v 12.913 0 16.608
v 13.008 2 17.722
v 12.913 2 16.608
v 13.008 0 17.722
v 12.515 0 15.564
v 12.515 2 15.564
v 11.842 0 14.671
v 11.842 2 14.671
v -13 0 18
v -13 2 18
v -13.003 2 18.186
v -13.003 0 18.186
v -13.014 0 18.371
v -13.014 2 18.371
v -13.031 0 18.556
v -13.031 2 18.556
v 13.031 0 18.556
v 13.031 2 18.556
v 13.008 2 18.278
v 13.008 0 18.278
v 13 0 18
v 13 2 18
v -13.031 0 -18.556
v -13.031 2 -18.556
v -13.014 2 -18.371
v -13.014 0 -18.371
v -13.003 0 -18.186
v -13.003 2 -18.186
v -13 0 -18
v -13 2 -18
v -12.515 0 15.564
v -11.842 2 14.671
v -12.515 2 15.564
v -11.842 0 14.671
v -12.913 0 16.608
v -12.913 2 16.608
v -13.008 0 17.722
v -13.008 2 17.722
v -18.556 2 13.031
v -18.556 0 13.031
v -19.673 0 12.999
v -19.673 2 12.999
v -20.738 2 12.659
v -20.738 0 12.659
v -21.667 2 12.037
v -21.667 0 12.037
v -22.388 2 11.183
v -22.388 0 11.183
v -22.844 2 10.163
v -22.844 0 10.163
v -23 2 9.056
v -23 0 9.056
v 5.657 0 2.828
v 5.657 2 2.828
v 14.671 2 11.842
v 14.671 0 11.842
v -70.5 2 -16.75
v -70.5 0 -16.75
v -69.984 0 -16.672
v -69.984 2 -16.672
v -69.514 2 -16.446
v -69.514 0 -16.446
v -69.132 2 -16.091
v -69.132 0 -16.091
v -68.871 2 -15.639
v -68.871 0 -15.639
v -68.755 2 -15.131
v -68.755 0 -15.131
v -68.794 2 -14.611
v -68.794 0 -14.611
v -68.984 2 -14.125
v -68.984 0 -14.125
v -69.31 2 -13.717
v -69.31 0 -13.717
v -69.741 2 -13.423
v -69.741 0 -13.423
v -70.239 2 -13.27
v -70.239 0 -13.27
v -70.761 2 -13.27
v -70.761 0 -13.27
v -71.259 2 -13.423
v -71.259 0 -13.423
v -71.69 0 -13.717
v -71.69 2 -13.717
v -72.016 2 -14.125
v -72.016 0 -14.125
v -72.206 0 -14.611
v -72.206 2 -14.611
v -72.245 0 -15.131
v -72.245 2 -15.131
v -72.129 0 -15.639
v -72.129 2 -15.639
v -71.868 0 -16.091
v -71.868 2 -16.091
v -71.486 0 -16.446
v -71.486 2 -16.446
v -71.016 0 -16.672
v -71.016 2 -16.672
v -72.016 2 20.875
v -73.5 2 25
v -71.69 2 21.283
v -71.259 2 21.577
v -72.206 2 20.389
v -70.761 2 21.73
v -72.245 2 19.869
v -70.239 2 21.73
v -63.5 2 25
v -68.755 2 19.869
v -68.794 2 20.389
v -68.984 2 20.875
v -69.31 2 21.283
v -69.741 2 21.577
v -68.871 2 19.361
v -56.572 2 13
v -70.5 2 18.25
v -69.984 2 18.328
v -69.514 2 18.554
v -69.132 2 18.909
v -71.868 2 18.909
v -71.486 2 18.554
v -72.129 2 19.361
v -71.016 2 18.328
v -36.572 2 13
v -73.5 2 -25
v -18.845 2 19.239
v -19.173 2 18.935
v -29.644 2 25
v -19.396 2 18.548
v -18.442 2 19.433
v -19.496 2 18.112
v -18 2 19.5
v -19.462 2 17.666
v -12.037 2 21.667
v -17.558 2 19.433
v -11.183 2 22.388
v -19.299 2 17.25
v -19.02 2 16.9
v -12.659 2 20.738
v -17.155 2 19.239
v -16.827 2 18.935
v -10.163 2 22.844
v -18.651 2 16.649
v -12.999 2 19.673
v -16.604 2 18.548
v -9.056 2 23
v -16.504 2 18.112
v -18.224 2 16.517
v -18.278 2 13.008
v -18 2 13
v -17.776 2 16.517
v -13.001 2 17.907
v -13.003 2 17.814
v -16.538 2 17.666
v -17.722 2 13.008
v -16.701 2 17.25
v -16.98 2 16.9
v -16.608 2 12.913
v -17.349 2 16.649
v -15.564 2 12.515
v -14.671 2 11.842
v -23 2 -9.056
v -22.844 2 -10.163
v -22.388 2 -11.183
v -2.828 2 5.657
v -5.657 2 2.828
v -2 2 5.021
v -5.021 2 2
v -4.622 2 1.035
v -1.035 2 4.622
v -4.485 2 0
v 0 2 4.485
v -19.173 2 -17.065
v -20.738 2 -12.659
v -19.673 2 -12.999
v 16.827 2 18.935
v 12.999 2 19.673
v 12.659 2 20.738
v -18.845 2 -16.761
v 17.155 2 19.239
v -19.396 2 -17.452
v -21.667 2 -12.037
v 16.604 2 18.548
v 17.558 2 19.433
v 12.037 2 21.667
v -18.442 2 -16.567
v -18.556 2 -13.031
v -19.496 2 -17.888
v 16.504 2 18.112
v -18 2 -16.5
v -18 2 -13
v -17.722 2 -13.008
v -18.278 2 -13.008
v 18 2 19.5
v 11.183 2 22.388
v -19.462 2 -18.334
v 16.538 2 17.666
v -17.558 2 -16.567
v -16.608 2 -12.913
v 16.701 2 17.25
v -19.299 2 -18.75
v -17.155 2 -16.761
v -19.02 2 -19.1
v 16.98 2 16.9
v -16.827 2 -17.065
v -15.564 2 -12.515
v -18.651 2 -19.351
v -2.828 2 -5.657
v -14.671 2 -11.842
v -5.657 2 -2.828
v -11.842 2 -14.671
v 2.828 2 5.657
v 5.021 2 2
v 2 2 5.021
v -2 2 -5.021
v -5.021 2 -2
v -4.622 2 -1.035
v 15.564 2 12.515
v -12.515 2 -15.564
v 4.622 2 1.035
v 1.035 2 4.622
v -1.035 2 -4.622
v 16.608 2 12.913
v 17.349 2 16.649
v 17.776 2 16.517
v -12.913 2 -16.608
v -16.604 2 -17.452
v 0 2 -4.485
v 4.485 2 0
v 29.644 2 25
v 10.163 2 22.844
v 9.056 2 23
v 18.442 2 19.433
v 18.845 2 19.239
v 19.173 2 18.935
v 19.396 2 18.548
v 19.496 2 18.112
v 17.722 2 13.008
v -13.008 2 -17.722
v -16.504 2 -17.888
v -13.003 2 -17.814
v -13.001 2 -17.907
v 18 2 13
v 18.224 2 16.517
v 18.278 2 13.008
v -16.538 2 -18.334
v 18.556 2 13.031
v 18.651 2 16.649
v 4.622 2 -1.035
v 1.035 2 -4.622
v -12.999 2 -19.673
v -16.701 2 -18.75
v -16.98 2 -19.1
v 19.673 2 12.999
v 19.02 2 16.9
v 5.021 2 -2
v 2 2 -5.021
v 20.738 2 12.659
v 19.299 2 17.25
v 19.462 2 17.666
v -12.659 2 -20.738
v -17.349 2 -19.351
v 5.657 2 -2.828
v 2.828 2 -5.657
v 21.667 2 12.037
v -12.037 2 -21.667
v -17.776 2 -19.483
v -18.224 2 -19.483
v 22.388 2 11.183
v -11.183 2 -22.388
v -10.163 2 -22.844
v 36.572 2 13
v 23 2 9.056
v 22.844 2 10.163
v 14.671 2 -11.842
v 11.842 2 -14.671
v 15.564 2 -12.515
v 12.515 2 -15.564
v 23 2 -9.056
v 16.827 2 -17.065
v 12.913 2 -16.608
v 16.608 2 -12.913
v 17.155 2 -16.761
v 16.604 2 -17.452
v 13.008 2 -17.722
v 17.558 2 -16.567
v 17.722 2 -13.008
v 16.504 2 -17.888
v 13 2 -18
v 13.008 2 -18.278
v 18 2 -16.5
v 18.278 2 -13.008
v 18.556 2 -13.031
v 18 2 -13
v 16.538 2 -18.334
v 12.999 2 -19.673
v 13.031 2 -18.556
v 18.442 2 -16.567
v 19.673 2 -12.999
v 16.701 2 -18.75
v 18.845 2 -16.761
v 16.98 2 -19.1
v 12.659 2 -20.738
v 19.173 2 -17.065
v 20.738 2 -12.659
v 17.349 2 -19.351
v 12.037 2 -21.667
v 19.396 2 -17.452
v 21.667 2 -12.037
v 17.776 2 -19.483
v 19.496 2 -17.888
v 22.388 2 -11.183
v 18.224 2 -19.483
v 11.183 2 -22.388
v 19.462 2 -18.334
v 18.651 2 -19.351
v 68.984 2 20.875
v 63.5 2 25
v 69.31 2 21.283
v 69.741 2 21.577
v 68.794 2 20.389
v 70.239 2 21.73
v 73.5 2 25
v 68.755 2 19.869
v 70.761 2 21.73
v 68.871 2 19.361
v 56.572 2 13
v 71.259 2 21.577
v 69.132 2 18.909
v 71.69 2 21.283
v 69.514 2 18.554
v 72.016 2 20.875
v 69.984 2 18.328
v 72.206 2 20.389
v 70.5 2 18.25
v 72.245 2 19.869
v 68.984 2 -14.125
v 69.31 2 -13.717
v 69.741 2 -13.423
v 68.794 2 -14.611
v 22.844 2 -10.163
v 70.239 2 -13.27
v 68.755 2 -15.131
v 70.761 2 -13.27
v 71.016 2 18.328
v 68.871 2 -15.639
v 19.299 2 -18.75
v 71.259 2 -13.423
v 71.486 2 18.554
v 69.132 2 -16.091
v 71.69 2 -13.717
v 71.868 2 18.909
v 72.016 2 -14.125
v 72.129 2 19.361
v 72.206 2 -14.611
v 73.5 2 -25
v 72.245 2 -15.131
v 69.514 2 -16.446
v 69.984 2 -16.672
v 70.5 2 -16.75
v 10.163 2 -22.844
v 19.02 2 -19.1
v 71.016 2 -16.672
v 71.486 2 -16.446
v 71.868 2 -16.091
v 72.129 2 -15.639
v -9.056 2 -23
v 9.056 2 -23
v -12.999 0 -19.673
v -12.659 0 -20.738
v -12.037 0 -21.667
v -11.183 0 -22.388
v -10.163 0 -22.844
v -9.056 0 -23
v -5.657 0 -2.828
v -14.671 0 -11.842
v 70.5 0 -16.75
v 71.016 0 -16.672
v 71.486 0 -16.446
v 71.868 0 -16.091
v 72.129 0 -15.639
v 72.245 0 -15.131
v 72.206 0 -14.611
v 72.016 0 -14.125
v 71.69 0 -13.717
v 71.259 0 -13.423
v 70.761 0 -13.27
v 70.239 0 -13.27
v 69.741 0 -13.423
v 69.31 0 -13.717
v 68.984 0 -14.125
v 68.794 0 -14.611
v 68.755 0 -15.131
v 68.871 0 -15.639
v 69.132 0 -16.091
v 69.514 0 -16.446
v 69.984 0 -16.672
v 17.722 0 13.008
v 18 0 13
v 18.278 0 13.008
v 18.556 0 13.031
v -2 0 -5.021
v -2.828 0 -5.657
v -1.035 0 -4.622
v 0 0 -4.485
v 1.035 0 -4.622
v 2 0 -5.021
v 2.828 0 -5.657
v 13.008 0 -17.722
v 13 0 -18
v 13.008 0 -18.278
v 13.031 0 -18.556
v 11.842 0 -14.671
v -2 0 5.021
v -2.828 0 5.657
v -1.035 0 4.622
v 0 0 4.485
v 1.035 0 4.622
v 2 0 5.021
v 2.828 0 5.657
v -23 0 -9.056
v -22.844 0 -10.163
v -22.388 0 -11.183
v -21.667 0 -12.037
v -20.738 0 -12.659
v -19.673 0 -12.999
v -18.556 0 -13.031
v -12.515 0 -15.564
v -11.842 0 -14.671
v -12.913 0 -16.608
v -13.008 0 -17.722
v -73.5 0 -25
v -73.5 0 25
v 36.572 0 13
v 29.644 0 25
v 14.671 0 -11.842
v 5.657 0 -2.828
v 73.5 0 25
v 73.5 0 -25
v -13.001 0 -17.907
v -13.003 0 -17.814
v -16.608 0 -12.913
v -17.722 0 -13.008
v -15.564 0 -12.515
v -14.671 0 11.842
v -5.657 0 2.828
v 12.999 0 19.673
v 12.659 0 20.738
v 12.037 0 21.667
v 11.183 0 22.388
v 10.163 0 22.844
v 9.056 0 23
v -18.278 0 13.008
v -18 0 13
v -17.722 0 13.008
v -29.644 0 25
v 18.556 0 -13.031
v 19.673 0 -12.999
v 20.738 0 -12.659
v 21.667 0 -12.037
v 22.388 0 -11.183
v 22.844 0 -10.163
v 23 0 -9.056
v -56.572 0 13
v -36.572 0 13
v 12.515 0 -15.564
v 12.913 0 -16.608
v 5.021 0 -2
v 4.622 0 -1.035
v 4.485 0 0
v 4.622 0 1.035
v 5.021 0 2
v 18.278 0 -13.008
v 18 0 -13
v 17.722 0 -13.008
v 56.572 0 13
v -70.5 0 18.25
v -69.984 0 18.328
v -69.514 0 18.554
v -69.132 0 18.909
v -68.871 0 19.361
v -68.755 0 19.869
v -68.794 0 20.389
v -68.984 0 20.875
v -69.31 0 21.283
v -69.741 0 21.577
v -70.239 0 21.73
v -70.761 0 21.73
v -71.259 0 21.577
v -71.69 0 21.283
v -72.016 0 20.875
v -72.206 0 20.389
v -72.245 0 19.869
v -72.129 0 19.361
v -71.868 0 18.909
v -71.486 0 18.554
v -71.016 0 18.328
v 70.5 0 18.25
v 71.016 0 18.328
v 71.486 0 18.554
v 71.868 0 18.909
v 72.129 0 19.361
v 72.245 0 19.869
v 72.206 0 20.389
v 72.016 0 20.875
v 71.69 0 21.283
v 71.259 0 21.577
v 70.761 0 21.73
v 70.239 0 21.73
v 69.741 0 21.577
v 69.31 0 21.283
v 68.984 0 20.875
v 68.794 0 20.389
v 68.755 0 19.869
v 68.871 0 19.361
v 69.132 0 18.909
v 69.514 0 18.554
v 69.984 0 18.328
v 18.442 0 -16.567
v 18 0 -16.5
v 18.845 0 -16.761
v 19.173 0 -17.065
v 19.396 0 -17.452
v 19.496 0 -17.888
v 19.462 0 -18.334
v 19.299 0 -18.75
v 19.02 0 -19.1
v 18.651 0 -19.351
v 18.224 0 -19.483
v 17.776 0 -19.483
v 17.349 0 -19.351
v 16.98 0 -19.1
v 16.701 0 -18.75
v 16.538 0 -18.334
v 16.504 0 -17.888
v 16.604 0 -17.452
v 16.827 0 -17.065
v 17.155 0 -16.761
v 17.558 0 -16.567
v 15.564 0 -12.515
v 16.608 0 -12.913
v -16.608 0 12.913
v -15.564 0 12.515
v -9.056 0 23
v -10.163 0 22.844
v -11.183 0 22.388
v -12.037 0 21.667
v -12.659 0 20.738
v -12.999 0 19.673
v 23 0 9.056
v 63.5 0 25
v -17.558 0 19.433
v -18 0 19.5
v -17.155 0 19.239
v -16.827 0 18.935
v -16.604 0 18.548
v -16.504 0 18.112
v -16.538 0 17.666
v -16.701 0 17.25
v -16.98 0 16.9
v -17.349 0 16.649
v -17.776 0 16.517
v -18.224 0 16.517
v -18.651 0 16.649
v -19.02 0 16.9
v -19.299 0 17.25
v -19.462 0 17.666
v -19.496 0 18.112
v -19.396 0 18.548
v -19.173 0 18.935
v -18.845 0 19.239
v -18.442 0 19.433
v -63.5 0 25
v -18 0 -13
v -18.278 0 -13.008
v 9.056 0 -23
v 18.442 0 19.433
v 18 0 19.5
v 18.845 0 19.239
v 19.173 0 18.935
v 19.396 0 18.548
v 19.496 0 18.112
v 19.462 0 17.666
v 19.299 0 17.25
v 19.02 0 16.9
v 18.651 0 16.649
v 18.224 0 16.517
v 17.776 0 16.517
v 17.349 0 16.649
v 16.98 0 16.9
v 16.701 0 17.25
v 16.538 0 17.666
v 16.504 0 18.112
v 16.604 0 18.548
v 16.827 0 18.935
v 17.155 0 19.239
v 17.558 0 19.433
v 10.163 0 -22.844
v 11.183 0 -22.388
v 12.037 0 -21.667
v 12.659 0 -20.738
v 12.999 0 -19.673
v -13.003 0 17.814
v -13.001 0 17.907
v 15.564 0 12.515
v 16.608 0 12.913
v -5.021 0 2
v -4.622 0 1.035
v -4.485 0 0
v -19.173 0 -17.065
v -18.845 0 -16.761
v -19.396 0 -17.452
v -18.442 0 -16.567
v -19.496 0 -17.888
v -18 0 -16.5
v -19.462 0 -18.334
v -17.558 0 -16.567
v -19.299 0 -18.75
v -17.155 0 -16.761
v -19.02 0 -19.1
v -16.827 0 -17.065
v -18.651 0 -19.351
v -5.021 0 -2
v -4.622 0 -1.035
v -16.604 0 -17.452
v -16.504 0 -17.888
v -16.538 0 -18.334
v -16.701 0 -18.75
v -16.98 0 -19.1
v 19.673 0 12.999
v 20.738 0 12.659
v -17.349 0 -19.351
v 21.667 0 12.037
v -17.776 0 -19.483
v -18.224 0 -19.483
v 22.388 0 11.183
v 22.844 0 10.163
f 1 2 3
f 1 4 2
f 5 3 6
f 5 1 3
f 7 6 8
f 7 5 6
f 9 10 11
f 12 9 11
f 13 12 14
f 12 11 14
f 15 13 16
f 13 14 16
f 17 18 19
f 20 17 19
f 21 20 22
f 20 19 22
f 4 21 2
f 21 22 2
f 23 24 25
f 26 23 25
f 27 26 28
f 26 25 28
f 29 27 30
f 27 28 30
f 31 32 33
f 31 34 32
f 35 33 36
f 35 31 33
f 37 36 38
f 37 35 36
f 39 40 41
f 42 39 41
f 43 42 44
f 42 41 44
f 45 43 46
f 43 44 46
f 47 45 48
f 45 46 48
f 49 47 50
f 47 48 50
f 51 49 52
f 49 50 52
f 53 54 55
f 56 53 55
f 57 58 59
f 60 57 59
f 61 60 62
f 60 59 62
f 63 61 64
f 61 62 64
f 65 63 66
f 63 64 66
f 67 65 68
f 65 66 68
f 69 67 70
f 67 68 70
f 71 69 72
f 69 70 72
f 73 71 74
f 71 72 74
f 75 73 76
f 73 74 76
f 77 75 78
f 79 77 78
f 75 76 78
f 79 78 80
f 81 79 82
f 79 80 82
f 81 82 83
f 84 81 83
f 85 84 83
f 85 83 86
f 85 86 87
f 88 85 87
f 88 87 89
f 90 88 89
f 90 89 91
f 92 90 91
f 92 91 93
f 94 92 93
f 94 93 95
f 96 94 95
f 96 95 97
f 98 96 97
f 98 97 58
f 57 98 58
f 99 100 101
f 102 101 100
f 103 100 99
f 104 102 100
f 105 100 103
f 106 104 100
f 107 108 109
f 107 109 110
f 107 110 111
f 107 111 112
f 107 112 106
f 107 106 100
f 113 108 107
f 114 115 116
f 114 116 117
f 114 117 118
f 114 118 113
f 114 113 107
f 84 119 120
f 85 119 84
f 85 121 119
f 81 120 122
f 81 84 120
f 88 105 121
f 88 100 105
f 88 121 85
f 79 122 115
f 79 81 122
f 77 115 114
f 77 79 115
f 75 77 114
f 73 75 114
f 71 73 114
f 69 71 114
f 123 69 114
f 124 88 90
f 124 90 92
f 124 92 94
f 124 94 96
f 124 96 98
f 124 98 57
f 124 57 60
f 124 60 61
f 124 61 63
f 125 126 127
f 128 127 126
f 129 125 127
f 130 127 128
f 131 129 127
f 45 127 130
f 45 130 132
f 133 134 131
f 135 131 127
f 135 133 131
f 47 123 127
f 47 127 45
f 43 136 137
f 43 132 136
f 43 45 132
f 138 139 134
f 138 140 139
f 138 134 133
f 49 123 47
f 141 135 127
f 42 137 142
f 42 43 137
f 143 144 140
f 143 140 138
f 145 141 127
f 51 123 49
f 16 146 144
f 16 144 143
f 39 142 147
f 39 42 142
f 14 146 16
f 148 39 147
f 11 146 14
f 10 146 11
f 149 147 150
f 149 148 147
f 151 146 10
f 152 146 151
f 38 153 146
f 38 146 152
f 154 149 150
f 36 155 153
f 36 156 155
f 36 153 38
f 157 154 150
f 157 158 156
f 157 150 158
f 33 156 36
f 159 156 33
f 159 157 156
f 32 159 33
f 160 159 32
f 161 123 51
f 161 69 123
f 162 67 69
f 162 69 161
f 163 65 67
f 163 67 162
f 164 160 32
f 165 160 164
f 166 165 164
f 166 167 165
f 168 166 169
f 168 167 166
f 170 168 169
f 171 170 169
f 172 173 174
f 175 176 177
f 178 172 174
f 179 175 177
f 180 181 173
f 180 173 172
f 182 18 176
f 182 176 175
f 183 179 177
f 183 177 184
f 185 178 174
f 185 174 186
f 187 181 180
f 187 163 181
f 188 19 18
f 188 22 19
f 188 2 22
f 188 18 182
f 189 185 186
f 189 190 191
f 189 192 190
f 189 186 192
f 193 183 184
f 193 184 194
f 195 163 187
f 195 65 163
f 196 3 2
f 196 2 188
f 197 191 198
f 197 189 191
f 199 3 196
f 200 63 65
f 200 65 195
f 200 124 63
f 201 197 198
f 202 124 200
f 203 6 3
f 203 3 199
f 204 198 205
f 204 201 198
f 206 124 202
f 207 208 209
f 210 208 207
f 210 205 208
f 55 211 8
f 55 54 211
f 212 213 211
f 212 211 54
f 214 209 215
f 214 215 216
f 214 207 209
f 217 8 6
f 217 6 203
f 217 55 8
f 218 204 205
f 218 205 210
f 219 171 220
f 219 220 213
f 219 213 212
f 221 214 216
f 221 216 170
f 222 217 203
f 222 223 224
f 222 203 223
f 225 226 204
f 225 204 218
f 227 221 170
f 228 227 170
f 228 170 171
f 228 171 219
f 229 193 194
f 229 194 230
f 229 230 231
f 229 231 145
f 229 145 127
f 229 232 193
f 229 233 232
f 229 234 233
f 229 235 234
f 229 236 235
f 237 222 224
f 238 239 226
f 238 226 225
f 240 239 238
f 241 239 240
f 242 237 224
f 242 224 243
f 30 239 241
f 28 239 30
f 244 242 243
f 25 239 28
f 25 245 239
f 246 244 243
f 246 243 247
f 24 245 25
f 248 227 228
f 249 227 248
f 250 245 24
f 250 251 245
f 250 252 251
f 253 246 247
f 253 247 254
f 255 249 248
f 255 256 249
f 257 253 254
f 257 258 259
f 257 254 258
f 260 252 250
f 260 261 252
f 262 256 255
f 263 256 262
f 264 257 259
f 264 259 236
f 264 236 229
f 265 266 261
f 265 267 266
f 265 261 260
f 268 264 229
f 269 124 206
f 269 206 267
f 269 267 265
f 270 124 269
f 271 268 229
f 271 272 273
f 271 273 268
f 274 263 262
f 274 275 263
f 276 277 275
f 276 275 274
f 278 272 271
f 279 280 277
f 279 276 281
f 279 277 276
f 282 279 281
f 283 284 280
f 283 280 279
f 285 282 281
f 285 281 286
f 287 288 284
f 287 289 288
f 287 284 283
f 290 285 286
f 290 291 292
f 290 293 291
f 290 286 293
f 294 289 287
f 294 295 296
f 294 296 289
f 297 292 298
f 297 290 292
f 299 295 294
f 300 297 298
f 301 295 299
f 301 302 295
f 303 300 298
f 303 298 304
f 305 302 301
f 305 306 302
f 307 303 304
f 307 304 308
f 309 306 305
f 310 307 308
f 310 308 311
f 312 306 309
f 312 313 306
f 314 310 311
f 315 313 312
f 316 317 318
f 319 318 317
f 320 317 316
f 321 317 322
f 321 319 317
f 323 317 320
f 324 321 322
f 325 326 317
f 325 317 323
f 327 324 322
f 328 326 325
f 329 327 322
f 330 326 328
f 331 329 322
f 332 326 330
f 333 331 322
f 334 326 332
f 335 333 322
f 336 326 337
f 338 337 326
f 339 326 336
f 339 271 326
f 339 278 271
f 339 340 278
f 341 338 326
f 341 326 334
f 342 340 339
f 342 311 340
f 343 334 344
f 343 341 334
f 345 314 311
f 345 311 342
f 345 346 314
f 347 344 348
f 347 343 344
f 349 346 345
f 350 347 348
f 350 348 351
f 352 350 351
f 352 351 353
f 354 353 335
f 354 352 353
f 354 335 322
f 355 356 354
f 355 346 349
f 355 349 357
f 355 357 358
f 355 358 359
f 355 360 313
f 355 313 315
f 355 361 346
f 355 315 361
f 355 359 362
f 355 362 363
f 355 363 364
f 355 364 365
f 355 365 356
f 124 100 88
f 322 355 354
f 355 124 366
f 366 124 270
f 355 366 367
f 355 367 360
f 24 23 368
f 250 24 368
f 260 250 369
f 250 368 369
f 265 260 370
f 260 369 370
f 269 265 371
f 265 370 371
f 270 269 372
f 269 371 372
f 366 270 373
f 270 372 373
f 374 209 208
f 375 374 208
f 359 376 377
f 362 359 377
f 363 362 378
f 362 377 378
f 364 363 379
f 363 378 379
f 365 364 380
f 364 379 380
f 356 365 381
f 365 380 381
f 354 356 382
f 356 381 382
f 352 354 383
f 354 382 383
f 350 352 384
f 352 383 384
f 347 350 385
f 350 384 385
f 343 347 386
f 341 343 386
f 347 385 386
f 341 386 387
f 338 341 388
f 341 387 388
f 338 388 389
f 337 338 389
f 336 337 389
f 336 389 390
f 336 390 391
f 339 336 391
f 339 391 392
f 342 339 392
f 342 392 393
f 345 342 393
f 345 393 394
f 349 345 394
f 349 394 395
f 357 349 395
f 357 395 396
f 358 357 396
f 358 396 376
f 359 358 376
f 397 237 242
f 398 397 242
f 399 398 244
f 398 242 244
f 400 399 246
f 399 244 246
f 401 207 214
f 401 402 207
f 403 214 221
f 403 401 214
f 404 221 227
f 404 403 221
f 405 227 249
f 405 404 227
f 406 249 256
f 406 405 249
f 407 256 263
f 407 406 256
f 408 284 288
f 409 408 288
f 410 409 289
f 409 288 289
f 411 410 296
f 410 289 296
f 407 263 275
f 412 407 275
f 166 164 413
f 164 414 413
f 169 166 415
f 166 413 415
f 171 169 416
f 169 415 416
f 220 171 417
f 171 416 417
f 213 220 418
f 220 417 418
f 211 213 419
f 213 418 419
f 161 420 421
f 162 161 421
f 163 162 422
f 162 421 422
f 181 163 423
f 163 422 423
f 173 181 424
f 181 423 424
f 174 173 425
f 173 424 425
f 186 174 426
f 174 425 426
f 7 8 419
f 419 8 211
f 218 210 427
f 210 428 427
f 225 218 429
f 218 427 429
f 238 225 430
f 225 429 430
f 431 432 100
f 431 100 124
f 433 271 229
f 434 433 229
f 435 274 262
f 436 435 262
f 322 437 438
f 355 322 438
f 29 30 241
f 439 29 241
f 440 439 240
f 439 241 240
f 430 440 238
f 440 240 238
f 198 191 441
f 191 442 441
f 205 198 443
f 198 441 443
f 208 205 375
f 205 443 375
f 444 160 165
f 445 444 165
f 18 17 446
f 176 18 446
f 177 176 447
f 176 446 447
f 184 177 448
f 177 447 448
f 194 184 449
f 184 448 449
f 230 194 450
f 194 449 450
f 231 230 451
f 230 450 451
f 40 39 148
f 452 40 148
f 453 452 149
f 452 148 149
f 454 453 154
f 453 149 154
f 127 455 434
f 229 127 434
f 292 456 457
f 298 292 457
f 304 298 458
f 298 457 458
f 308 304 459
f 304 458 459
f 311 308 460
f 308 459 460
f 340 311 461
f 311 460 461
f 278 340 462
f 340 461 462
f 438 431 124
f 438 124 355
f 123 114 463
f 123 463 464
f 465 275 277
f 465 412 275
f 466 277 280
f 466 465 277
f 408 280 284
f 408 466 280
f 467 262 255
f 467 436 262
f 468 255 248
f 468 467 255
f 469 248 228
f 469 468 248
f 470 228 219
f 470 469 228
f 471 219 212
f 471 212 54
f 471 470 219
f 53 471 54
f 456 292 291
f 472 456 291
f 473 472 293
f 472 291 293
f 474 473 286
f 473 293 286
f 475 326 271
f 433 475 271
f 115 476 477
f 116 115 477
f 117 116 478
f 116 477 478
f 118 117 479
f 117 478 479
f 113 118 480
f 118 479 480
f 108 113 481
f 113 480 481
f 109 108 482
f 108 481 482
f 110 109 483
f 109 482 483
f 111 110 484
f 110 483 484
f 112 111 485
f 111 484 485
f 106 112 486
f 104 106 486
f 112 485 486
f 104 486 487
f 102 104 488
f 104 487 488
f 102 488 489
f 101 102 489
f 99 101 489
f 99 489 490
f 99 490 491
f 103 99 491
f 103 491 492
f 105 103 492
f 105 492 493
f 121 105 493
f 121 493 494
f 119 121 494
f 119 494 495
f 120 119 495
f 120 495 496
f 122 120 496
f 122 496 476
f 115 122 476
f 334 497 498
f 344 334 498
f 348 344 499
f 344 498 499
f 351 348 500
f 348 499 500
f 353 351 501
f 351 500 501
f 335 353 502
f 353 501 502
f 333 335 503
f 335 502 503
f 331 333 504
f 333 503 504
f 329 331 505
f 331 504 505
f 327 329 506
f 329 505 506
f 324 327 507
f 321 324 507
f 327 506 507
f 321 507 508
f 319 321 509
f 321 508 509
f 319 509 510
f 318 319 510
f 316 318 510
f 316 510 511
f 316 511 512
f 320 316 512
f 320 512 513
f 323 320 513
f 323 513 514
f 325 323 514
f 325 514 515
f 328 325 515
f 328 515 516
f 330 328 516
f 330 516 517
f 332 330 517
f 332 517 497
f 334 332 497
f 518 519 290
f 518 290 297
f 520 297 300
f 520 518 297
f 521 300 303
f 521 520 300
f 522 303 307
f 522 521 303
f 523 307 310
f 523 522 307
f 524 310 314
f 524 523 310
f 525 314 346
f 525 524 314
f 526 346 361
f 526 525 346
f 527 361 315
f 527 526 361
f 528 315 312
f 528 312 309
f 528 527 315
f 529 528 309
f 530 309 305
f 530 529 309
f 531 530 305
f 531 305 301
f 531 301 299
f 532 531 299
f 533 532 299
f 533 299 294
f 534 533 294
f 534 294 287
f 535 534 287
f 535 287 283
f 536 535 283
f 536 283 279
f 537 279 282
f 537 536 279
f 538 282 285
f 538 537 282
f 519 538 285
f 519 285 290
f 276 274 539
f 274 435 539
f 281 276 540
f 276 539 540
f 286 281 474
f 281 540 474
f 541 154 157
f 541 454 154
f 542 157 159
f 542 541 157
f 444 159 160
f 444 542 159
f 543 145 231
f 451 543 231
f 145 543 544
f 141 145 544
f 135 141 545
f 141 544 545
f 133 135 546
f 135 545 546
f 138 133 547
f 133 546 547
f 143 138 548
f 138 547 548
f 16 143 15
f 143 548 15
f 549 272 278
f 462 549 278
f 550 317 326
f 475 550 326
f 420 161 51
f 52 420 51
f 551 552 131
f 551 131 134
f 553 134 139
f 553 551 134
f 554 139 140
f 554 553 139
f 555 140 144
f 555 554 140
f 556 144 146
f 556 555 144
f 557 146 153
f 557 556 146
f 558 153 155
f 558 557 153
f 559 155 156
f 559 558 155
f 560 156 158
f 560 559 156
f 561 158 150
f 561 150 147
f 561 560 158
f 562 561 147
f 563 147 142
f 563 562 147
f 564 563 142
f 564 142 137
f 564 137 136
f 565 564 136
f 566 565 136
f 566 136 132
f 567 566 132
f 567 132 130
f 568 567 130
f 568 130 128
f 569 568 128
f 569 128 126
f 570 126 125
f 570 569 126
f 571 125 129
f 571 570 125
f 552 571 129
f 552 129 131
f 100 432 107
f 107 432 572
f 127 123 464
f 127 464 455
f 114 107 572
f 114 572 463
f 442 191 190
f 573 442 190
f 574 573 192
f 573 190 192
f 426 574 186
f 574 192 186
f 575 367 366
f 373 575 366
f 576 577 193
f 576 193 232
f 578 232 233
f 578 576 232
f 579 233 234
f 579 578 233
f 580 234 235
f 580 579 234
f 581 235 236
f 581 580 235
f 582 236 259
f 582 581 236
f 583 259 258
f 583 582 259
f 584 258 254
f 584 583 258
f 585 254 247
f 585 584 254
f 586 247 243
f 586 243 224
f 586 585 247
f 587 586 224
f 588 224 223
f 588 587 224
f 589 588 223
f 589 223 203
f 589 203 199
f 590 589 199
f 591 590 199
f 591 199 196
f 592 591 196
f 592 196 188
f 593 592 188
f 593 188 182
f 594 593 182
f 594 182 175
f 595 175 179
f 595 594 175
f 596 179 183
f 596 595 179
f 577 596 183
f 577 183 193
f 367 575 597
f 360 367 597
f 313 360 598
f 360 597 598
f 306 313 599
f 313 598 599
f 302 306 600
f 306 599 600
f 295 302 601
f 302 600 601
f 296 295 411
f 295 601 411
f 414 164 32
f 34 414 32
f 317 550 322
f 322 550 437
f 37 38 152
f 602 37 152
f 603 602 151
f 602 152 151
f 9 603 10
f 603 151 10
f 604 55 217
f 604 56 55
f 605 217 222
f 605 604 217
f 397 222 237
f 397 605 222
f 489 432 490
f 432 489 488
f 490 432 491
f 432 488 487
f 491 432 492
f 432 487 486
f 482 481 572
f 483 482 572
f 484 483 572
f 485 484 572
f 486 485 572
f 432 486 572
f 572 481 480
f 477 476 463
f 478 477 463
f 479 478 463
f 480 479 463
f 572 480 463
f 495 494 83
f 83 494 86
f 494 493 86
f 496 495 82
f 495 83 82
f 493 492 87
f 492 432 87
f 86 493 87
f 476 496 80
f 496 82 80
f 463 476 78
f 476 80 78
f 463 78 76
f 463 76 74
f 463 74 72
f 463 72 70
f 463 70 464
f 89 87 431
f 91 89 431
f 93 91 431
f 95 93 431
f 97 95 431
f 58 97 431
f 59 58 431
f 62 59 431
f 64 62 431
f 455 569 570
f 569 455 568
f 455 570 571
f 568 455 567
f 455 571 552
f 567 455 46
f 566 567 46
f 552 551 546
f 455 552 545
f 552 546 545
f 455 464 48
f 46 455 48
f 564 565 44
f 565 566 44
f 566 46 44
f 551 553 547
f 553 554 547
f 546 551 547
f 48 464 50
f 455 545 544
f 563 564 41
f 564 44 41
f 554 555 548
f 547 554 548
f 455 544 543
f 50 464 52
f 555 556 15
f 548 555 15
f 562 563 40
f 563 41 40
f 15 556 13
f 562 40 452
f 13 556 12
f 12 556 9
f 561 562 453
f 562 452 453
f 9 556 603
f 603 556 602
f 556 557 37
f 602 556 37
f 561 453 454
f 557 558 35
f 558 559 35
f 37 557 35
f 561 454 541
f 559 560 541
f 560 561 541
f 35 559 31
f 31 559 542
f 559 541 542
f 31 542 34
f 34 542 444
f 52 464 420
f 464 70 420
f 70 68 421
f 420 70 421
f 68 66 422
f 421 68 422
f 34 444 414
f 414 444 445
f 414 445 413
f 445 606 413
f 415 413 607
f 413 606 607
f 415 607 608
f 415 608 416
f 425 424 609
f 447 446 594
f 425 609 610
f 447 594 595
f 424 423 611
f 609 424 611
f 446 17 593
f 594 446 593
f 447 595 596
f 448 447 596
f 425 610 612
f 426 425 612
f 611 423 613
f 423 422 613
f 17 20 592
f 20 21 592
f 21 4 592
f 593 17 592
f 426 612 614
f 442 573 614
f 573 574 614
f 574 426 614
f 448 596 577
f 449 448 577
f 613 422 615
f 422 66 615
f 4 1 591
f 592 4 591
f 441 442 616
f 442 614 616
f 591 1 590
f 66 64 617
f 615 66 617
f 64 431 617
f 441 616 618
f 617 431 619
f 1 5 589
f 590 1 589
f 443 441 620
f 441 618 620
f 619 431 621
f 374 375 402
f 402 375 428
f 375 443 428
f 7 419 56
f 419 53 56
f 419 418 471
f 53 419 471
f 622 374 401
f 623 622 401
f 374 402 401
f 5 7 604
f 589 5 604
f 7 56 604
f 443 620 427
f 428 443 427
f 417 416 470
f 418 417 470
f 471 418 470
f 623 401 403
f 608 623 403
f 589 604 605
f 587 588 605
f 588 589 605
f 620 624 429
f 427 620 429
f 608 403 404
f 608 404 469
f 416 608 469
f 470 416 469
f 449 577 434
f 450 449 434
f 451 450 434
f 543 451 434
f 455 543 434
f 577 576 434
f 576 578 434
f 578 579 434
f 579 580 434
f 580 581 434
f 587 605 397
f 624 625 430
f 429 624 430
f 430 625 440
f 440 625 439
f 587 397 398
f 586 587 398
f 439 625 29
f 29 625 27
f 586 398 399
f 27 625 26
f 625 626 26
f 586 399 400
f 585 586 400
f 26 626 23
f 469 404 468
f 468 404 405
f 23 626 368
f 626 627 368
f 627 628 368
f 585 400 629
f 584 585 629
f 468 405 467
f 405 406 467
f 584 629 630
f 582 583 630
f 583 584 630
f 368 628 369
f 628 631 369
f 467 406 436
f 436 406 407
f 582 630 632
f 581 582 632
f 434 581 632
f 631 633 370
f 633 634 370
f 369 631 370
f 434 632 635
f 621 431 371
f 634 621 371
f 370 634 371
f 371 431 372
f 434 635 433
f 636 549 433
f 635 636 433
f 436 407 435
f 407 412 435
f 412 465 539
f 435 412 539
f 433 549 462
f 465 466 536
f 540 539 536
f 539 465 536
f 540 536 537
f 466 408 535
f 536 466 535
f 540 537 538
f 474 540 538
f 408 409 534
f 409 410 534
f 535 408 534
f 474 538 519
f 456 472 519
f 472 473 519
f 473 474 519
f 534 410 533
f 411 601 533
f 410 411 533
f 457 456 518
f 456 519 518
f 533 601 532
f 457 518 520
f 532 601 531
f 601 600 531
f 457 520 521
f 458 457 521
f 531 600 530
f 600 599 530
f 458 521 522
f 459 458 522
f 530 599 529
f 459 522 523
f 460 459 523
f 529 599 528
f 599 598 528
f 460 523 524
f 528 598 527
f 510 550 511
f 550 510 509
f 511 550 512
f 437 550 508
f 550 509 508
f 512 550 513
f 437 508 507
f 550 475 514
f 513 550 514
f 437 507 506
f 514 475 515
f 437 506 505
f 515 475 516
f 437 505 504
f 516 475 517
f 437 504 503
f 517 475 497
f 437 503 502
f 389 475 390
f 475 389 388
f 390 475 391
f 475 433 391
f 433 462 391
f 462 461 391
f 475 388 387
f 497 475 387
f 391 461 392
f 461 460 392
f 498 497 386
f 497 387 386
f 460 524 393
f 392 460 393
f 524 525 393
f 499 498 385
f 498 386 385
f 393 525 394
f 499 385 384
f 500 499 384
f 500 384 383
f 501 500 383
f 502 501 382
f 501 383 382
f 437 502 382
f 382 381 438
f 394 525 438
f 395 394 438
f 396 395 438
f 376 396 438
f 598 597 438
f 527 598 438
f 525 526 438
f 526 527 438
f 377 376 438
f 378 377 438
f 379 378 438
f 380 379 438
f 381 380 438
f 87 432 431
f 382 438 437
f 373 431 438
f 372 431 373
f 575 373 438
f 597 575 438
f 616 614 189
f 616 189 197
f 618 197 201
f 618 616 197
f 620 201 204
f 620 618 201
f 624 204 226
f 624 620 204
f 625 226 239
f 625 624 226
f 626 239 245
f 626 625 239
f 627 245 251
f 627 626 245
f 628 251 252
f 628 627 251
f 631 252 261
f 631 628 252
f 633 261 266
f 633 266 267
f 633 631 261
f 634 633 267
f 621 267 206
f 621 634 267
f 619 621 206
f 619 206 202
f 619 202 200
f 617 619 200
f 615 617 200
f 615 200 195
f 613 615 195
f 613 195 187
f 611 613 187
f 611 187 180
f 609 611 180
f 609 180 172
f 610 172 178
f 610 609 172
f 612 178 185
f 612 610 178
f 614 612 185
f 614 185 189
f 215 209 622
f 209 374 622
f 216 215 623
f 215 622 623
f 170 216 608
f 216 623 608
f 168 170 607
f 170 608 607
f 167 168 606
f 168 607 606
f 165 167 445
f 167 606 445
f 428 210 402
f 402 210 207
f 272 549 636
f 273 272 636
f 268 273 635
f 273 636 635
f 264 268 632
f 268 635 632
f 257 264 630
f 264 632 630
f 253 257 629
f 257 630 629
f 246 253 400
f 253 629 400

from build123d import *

# Parameters (mm, degrees)
SKETCH_1_W          = 147
SKETCH_1_H          = 50
SKETCH_1_R          = 1.5
EXTRUDE_1_DEPTH     = 2
CUT_EXTRUDE_1_DEPTH = 2
FILLET_2_DEPTH      = 2
FILLET_3_R          = 4
CUT_EXTRUDE_3_DEPTH = 78.661122835
SKETCH_7_R          = 1.75
CUT_EXTRUDE_4_DEPTH = 78.661122835


with BuildPart() as part:
    # 草图1 → 凸台-拉伸1 (new body)
    with BuildSketch(Plane(origin=(0, 0, 0), x_dir=(1, 0, 0), z_dir=(0, 1, 0))):
        Rectangle(SKETCH_1_W, SKETCH_1_H)
        with Locations(Location((18, -18, 0), (0, 0, 270))):
            Circle(SKETCH_1_R, mode=Mode.SUBTRACT)
        with Locations(Location((-18, -18, 0), (0, 0, 270))):
            Circle(SKETCH_1_R, mode=Mode.SUBTRACT)
        with Locations(Location((-18, 18, 0), (0, 0, 270))):
            Circle(SKETCH_1_R, mode=Mode.SUBTRACT)
        with Locations(Location((18, 18, 0), (0, 0, 270))):
            Circle(SKETCH_1_R, mode=Mode.SUBTRACT)
    extrude(amount=EXTRUDE_1_DEPTH)

    # 草图3 → 切除-拉伸1 (cut)
    with BuildSketch(Plane(origin=(0, 2, 0), x_dir=(1, 0, 0), z_dir=(0, 1, 0))):
        with BuildLine():
            Line((-13.345416088, 16.173843213), (0, 2.828427125))
            Line((0, 2.828427125), (13.345416088, 16.173843213))
            ThreePointArc((13.345416088, 16.173843213), (13.868972045, 20.816843629), (18, 23))
            Line((18, 23), (-18, 23))
            ThreePointArc((-18, 23), (-14.464466094, 21.535533906), (-13, 18))
            ThreePointArc((-13, 18), (-13.087112888, 17.070731352), (-13.345416088, 16.173843213))
        make_face()
        with BuildLine():
            Line((16.173843213, 13.345416088), (2.828427125, 0))
            Line((2.828427125, 0), (16.173843213, -13.345416088))
            ThreePointArc((16.173843213, -13.345416088), (20.816843629, -13.868972045), (23, -18))
            Line((23, -18), (23, 18))
            ThreePointArc((23, 18), (20.816843629, 13.868972045), (16.173843213, 13.345416088))
        make_face()
        with BuildLine():
            Line((0, -2.828427125), (-13.345416088, -16.173843213))
            ThreePointArc((-13.345416088, -16.173843213), (-13.087112888, -17.070731352), (-13, -18))
            ThreePointArc((-13, -18), (-14.464466094, -21.535533906), (-18, -23))
            Line((-18, -23), (18, -23))
            ThreePointArc((18, -23), (13.868972045, -20.816843629), (13.345416088, -16.173843213))
            Line((13.345416088, -16.173843213), (0, -2.828427125))
        make_face()
        with BuildLine():
            ThreePointArc((-23, -18), (-20.816843629, -13.868972045), (-16.173843213, -13.345416088))
            Line((-16.173843213, -13.345416088), (-2.828427125, 0))
            Line((-2.828427125, 0), (-16.173843213, 13.345416088))
            ThreePointArc((-16.173843213, 13.345416088), (-20.816843629, 13.868972045), (-23, 18))
            Line((-23, 18), (-23, -18))
        make_face()
    extrude(amount=-CUT_EXTRUDE_1_DEPTH, mode=Mode.SUBTRACT)

    # 圆角2: read off the stored shape, not the designer's step
    # 圆角2 outline → 圆角2 (add)
    with BuildSketch(Plane(origin=(0, 0, 0), x_dir=(1, 0, 0), z_dir=(0, 1, 0))):
        with BuildLine():
            Line((-23, 18), (-23, 9.05572809))
            ThreePointArc((-23, 9.05572809), (-21.666666667, 12.03715206), (-18.555555556, 13.03096005))
            ThreePointArc((-18.555555556, 13.03096005), (-21.726779962, 14.666666667), (-23, 18))
        make_face()
        with BuildLine():
            ThreePointArc((-18.555555556, -13.03096005), (-21.666666667, -12.03715206), (-23, -9.05572809))
            Line((-23, -9.05572809), (-23, -18))
            ThreePointArc((-23, -18), (-21.726779962, -14.666666667), (-18.555555556, -13.03096005))
        make_face()
        with BuildLine():
            ThreePointArc((13.03096005, -18.555555556), (12.03715206, -21.666666667), (9.05572809, -23))
            Line((9.05572809, -23), (18, -23))
            ThreePointArc((18, -23), (14.666666667, -21.726779962), (13.03096005, -18.555555556))
        make_face()
        with BuildLine():
            ThreePointArc((-9.05572809, -23), (-12.03715206, -21.666666667), (-13.03096005, -18.555555556))
            ThreePointArc((-13.03096005, -18.555555556), (-14.666666667, -21.726779962), (-18, -23))
            Line((-18, -23), (-9.05572809, -23))
        make_face()
        with BuildLine():
            ThreePointArc((18.555555556, 13.03096005), (21.666666667, 12.03715206), (23, 9.05572809))
            Line((23, 9.05572809), (23, 18))
            ThreePointArc((23, 18), (21.726779962, 14.666666667), (18.555555556, 13.03096005))
        make_face()
        with BuildLine():
            ThreePointArc((23, -9.05572809), (21.666666667, -12.03715206), (18.555555556, -13.03096005))
            ThreePointArc((18.555555556, -13.03096005), (21.726779962, -14.666666667), (23, -18))
            Line((23, -18), (23, -9.05572809))
        make_face()
        with BuildLine():
            ThreePointArc((-13.03096005, 18.555555556), (-12.03715206, 21.666666667), (-9.05572809, 23))
            Line((-9.05572809, 23), (-18, 23))
            ThreePointArc((-18, 23), (-14.666666667, 21.726779962), (-13.03096005, 18.555555556))
        make_face()
        with BuildLine():
            ThreePointArc((9.05572809, 23), (12.03715206, 21.666666667), (13.03096005, 18.555555556))
            ThreePointArc((13.03096005, 18.555555556), (14.666666667, 21.726779962), (18, 23))
            Line((18, 23), (9.05572809, 23))
        make_face()
    extrude(amount=FILLET_2_DEPTH)

    # 圆角3
    fillet_3_edges = [part.edges().sort_by_distance(p)[0] for p in [
        (13.345416088, 1, 16.173843213),
        (-13.345416088, 1, 16.173843213),
        (0, 1, 2.828427125),
        (16.173843213, 1, -13.345416088),
        (16.173843213, 1, 13.345416088),
        (2.828427125, 1, 0),
        (-16.173843213, 1, -13.345416088),
        (-2.828427125, 1, 0),
        (-16.173843213, 1, 13.345416088),
        (-13.345416088, 1, -16.173843213),
        (13.345416088, 1, -16.173843213),
        (0, 1, -2.828427125),
    ]]
    fillet(fillet_3_edges, radius=FILLET_3_R)

    # 草图6 → 切除-拉伸3 (cut, through all)
    with BuildSketch(Plane(origin=(0, 2, 0), x_dir=(1, 0, 0), z_dir=(0, 1, 0))):
        Polygon((63.5, -25), (56.57179677, -13), (36.57179677, -13), (29.643593539, -25), align=None)
    cut_extrude_3 = extrude(amount=-CUT_EXTRUDE_3_DEPTH, mode=Mode.SUBTRACT)

    # 镜向1: 切除-拉伸3 across plane
    add(cut_extrude_3.mirror(Plane(origin=(0, 0, 0), x_dir=(0, 0, 1), z_dir=(1, 0, 0))), mode=Mode.SUBTRACT)

    # 草图7 → 切除-拉伸4 (cut, through all)
    with BuildSketch(Plane.XZ):
        with Locations(Location((70.5, 20, 0), (0, 0, 270))):
            Circle(SKETCH_7_R)
        with Locations(Location((70.5, -15, 0), (0, 0, 270))):
            Circle(SKETCH_7_R)
        with Locations(Location((-70.5, -15, 0), (0, 0, 270))):
            Circle(SKETCH_7_R)
        with Locations(Location((-70.5, 20, 0), (0, 0, 270))):
            Circle(SKETCH_7_R)
    extrude(amount=-CUT_EXTRUDE_4_DEPTH, mode=Mode.SUBTRACT)


solid = part.part
